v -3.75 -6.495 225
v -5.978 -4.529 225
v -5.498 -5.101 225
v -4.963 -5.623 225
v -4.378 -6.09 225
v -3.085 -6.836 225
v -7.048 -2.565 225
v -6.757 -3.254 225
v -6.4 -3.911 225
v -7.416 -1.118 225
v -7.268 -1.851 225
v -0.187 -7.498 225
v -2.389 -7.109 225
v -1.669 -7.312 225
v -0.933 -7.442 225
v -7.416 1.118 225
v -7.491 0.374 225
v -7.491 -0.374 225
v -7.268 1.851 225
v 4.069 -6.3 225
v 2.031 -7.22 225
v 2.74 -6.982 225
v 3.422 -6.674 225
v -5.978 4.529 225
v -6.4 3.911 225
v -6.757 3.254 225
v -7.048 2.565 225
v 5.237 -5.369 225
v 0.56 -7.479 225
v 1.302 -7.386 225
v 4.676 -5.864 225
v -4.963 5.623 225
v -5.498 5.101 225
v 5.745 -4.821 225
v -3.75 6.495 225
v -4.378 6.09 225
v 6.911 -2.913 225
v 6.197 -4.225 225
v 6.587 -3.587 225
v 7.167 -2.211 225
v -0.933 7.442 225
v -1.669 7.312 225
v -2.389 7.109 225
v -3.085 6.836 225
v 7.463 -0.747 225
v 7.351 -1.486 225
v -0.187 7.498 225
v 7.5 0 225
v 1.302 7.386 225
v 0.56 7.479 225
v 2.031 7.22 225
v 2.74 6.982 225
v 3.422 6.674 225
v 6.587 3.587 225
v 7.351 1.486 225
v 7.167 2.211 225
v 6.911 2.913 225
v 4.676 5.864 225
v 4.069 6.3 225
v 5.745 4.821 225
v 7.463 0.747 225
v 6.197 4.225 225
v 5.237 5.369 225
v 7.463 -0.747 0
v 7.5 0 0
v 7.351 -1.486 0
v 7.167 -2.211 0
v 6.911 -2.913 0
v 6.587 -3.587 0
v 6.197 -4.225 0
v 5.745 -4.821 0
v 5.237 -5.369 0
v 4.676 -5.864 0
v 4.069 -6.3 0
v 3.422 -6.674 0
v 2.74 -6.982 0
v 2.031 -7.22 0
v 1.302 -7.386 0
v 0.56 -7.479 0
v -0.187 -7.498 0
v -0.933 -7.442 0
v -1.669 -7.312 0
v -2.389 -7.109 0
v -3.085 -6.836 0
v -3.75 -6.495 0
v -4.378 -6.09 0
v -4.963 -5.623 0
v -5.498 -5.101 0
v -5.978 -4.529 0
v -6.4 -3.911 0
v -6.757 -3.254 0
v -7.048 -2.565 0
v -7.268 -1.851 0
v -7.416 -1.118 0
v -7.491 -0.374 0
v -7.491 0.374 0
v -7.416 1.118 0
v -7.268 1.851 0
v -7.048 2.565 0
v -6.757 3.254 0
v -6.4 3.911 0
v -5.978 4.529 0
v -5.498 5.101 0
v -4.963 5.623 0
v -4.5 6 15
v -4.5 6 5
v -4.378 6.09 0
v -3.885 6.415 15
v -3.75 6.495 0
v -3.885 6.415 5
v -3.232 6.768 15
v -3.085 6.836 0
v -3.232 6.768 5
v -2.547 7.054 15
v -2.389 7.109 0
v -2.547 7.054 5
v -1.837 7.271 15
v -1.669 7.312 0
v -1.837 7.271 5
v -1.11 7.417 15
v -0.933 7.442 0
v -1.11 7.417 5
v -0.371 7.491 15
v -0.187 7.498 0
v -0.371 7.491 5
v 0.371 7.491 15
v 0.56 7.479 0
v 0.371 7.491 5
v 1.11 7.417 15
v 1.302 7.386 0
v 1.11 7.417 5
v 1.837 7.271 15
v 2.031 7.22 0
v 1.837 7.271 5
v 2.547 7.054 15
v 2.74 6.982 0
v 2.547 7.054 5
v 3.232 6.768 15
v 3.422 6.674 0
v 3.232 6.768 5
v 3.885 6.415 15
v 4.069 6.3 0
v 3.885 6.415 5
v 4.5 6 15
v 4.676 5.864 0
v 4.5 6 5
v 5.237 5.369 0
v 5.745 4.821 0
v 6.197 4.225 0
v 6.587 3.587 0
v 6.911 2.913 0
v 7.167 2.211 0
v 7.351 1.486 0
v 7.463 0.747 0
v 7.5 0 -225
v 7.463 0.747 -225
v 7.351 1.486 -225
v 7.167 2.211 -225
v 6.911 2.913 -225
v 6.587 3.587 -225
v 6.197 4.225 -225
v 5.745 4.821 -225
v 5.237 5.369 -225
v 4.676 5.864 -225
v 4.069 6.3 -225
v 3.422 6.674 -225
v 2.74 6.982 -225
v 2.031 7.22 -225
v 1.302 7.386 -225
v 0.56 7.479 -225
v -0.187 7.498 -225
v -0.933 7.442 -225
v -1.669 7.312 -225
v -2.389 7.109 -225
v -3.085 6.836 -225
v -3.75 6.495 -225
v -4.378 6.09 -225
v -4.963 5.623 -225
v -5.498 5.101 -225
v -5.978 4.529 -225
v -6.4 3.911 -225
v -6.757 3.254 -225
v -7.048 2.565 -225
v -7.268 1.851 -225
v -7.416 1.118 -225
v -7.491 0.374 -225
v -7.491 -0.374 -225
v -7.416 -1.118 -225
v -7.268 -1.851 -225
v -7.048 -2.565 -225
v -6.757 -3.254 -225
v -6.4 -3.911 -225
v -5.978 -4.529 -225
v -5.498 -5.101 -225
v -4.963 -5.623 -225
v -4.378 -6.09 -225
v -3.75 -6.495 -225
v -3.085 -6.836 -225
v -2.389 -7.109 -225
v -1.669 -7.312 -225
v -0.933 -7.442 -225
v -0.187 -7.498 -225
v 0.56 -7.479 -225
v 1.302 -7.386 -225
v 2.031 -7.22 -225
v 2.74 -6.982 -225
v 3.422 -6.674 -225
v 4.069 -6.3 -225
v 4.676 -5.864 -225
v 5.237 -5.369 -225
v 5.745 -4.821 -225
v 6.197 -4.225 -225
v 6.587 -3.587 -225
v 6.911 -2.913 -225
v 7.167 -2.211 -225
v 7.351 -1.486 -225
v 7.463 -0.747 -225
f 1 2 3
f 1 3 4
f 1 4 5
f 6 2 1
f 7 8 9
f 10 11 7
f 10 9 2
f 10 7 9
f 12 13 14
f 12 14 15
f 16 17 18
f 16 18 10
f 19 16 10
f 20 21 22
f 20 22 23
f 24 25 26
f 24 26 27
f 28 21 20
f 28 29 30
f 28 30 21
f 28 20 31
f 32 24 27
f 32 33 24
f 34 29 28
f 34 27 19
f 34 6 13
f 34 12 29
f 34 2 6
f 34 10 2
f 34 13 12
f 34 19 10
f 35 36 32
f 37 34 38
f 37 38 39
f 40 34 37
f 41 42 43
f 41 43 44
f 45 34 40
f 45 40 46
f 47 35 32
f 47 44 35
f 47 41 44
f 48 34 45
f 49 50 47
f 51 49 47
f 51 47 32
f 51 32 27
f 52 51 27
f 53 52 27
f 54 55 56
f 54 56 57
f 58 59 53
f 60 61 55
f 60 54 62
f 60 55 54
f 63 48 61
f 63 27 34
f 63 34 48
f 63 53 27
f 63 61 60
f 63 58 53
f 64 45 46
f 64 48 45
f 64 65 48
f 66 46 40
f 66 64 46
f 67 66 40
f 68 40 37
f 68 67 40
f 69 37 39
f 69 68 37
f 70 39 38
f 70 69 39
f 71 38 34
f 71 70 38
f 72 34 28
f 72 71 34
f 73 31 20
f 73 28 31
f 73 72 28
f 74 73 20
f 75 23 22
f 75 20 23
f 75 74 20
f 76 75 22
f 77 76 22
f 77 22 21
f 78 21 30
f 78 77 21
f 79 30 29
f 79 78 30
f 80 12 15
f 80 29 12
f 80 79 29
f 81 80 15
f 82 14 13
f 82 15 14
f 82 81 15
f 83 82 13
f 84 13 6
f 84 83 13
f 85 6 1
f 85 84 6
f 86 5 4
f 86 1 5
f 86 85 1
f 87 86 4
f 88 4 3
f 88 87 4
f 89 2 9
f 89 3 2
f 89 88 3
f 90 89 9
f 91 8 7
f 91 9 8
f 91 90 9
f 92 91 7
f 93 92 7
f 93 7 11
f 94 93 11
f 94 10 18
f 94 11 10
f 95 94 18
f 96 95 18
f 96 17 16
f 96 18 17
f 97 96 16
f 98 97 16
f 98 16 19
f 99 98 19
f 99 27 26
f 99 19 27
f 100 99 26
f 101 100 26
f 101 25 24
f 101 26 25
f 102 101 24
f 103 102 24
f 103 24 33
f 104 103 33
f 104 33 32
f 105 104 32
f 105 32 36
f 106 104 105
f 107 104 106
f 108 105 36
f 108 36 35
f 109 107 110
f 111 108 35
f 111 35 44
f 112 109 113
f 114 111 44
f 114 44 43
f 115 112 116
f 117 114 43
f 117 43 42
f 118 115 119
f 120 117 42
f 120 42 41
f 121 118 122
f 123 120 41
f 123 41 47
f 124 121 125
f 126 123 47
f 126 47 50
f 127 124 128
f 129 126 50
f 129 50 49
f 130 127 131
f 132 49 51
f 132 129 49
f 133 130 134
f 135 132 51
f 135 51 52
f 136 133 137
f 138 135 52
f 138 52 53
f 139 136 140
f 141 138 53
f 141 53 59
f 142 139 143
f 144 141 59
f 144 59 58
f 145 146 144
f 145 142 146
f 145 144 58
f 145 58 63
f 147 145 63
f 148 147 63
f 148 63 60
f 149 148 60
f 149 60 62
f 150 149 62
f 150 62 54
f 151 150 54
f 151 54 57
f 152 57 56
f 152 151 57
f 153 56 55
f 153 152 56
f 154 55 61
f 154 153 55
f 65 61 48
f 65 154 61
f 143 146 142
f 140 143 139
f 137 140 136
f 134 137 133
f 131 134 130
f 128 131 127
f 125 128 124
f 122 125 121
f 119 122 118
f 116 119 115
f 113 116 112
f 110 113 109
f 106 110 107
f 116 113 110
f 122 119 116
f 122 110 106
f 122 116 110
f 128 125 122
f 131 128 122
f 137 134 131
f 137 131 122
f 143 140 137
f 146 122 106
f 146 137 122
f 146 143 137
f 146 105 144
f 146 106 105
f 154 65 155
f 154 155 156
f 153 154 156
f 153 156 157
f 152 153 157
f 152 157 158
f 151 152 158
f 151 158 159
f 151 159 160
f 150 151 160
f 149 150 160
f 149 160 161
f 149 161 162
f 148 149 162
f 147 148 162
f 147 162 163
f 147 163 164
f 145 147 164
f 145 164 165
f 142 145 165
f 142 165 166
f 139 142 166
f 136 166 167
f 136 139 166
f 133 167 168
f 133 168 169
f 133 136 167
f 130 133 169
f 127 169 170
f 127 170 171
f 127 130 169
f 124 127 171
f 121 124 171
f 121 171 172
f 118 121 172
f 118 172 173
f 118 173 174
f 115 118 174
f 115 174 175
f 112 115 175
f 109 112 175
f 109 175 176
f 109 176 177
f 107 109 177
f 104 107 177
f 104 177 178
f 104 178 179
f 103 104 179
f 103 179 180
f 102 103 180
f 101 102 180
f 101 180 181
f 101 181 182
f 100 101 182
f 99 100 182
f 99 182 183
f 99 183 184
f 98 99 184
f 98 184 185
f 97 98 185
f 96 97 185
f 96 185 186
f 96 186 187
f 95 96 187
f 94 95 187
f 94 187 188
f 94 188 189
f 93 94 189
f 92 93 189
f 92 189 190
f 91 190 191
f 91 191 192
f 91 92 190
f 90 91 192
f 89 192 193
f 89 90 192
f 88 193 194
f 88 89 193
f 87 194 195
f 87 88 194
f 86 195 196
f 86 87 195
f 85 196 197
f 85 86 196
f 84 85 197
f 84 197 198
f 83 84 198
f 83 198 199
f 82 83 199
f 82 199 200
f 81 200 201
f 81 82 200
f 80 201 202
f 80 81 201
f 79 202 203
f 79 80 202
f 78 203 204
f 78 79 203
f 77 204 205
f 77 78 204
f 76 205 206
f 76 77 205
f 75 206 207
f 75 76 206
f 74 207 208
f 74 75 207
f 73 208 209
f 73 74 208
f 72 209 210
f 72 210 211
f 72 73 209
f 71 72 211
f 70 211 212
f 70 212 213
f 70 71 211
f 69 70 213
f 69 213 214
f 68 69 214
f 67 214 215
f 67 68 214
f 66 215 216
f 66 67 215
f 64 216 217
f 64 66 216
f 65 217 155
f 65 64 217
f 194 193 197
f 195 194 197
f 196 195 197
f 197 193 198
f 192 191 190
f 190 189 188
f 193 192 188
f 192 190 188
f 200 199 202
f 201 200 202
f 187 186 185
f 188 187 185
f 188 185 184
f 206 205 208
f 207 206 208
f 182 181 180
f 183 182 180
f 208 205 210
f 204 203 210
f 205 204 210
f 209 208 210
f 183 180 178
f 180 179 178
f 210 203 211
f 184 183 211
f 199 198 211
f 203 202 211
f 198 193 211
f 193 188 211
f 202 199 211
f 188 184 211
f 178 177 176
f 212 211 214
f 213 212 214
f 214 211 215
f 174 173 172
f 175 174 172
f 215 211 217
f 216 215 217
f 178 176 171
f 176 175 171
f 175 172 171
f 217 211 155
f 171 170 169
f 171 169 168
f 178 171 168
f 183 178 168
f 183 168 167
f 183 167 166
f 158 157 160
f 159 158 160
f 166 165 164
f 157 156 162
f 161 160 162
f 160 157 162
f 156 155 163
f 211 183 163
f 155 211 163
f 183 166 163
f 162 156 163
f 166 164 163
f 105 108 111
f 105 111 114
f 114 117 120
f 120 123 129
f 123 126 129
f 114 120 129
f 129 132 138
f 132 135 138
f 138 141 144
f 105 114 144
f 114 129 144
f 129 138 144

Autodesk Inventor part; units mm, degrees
ref_plane "YZ Plane" through (0, 0, 0) normal (1, 0, 0) x (0, 1, 0)
ref_plane "XZ Plane" through (0, 0, 0) normal (0, 1, 0) x (-1, 0, 0)
sketch "Boceto1" plane through (0, 0, 0) normal (0, 0, 1) x (1, 0, 0)
  circle A0 centre (0, 0) radius 7.5
  dimension "d0" = 15
extrude "Extrusión1" add sketch "Boceto1" along normal mid plane 450
ref_plane "Plano de trabajo1" through (0, 0, 5) normal (0, 0, 1) x (1, 0, 0)
sketch "Boceto5" plane through (0, 0, 5) normal (0, 0, 1) x (1, 0, 0)
  circle A0 centre (0, 0) radius 7.5
  circle A1 centre (0, 0) radius 7.5 projected
  line L0 (0, 0) -> (0, 7.5)
  line L1 (0, 7.5) -> (0, 6)
  line L2 (0, 6) -> (4.5, 6)
  arc A2 (4.5, 6) -> (-4.5, 6) centre (0, 0) ccw
  line L3 (0, 6) -> (-4.5, 6)
  point P0 (-4.5, 6)
  dimension "d10" = 15
  dimension "d11" = 1.5
extrude "Extrusión4" cut sketch "Boceto5" along normal blind 10 contours L2 L0 A0 | A0 L0 L3
properties part number "Eje_Engranes_llanta"
